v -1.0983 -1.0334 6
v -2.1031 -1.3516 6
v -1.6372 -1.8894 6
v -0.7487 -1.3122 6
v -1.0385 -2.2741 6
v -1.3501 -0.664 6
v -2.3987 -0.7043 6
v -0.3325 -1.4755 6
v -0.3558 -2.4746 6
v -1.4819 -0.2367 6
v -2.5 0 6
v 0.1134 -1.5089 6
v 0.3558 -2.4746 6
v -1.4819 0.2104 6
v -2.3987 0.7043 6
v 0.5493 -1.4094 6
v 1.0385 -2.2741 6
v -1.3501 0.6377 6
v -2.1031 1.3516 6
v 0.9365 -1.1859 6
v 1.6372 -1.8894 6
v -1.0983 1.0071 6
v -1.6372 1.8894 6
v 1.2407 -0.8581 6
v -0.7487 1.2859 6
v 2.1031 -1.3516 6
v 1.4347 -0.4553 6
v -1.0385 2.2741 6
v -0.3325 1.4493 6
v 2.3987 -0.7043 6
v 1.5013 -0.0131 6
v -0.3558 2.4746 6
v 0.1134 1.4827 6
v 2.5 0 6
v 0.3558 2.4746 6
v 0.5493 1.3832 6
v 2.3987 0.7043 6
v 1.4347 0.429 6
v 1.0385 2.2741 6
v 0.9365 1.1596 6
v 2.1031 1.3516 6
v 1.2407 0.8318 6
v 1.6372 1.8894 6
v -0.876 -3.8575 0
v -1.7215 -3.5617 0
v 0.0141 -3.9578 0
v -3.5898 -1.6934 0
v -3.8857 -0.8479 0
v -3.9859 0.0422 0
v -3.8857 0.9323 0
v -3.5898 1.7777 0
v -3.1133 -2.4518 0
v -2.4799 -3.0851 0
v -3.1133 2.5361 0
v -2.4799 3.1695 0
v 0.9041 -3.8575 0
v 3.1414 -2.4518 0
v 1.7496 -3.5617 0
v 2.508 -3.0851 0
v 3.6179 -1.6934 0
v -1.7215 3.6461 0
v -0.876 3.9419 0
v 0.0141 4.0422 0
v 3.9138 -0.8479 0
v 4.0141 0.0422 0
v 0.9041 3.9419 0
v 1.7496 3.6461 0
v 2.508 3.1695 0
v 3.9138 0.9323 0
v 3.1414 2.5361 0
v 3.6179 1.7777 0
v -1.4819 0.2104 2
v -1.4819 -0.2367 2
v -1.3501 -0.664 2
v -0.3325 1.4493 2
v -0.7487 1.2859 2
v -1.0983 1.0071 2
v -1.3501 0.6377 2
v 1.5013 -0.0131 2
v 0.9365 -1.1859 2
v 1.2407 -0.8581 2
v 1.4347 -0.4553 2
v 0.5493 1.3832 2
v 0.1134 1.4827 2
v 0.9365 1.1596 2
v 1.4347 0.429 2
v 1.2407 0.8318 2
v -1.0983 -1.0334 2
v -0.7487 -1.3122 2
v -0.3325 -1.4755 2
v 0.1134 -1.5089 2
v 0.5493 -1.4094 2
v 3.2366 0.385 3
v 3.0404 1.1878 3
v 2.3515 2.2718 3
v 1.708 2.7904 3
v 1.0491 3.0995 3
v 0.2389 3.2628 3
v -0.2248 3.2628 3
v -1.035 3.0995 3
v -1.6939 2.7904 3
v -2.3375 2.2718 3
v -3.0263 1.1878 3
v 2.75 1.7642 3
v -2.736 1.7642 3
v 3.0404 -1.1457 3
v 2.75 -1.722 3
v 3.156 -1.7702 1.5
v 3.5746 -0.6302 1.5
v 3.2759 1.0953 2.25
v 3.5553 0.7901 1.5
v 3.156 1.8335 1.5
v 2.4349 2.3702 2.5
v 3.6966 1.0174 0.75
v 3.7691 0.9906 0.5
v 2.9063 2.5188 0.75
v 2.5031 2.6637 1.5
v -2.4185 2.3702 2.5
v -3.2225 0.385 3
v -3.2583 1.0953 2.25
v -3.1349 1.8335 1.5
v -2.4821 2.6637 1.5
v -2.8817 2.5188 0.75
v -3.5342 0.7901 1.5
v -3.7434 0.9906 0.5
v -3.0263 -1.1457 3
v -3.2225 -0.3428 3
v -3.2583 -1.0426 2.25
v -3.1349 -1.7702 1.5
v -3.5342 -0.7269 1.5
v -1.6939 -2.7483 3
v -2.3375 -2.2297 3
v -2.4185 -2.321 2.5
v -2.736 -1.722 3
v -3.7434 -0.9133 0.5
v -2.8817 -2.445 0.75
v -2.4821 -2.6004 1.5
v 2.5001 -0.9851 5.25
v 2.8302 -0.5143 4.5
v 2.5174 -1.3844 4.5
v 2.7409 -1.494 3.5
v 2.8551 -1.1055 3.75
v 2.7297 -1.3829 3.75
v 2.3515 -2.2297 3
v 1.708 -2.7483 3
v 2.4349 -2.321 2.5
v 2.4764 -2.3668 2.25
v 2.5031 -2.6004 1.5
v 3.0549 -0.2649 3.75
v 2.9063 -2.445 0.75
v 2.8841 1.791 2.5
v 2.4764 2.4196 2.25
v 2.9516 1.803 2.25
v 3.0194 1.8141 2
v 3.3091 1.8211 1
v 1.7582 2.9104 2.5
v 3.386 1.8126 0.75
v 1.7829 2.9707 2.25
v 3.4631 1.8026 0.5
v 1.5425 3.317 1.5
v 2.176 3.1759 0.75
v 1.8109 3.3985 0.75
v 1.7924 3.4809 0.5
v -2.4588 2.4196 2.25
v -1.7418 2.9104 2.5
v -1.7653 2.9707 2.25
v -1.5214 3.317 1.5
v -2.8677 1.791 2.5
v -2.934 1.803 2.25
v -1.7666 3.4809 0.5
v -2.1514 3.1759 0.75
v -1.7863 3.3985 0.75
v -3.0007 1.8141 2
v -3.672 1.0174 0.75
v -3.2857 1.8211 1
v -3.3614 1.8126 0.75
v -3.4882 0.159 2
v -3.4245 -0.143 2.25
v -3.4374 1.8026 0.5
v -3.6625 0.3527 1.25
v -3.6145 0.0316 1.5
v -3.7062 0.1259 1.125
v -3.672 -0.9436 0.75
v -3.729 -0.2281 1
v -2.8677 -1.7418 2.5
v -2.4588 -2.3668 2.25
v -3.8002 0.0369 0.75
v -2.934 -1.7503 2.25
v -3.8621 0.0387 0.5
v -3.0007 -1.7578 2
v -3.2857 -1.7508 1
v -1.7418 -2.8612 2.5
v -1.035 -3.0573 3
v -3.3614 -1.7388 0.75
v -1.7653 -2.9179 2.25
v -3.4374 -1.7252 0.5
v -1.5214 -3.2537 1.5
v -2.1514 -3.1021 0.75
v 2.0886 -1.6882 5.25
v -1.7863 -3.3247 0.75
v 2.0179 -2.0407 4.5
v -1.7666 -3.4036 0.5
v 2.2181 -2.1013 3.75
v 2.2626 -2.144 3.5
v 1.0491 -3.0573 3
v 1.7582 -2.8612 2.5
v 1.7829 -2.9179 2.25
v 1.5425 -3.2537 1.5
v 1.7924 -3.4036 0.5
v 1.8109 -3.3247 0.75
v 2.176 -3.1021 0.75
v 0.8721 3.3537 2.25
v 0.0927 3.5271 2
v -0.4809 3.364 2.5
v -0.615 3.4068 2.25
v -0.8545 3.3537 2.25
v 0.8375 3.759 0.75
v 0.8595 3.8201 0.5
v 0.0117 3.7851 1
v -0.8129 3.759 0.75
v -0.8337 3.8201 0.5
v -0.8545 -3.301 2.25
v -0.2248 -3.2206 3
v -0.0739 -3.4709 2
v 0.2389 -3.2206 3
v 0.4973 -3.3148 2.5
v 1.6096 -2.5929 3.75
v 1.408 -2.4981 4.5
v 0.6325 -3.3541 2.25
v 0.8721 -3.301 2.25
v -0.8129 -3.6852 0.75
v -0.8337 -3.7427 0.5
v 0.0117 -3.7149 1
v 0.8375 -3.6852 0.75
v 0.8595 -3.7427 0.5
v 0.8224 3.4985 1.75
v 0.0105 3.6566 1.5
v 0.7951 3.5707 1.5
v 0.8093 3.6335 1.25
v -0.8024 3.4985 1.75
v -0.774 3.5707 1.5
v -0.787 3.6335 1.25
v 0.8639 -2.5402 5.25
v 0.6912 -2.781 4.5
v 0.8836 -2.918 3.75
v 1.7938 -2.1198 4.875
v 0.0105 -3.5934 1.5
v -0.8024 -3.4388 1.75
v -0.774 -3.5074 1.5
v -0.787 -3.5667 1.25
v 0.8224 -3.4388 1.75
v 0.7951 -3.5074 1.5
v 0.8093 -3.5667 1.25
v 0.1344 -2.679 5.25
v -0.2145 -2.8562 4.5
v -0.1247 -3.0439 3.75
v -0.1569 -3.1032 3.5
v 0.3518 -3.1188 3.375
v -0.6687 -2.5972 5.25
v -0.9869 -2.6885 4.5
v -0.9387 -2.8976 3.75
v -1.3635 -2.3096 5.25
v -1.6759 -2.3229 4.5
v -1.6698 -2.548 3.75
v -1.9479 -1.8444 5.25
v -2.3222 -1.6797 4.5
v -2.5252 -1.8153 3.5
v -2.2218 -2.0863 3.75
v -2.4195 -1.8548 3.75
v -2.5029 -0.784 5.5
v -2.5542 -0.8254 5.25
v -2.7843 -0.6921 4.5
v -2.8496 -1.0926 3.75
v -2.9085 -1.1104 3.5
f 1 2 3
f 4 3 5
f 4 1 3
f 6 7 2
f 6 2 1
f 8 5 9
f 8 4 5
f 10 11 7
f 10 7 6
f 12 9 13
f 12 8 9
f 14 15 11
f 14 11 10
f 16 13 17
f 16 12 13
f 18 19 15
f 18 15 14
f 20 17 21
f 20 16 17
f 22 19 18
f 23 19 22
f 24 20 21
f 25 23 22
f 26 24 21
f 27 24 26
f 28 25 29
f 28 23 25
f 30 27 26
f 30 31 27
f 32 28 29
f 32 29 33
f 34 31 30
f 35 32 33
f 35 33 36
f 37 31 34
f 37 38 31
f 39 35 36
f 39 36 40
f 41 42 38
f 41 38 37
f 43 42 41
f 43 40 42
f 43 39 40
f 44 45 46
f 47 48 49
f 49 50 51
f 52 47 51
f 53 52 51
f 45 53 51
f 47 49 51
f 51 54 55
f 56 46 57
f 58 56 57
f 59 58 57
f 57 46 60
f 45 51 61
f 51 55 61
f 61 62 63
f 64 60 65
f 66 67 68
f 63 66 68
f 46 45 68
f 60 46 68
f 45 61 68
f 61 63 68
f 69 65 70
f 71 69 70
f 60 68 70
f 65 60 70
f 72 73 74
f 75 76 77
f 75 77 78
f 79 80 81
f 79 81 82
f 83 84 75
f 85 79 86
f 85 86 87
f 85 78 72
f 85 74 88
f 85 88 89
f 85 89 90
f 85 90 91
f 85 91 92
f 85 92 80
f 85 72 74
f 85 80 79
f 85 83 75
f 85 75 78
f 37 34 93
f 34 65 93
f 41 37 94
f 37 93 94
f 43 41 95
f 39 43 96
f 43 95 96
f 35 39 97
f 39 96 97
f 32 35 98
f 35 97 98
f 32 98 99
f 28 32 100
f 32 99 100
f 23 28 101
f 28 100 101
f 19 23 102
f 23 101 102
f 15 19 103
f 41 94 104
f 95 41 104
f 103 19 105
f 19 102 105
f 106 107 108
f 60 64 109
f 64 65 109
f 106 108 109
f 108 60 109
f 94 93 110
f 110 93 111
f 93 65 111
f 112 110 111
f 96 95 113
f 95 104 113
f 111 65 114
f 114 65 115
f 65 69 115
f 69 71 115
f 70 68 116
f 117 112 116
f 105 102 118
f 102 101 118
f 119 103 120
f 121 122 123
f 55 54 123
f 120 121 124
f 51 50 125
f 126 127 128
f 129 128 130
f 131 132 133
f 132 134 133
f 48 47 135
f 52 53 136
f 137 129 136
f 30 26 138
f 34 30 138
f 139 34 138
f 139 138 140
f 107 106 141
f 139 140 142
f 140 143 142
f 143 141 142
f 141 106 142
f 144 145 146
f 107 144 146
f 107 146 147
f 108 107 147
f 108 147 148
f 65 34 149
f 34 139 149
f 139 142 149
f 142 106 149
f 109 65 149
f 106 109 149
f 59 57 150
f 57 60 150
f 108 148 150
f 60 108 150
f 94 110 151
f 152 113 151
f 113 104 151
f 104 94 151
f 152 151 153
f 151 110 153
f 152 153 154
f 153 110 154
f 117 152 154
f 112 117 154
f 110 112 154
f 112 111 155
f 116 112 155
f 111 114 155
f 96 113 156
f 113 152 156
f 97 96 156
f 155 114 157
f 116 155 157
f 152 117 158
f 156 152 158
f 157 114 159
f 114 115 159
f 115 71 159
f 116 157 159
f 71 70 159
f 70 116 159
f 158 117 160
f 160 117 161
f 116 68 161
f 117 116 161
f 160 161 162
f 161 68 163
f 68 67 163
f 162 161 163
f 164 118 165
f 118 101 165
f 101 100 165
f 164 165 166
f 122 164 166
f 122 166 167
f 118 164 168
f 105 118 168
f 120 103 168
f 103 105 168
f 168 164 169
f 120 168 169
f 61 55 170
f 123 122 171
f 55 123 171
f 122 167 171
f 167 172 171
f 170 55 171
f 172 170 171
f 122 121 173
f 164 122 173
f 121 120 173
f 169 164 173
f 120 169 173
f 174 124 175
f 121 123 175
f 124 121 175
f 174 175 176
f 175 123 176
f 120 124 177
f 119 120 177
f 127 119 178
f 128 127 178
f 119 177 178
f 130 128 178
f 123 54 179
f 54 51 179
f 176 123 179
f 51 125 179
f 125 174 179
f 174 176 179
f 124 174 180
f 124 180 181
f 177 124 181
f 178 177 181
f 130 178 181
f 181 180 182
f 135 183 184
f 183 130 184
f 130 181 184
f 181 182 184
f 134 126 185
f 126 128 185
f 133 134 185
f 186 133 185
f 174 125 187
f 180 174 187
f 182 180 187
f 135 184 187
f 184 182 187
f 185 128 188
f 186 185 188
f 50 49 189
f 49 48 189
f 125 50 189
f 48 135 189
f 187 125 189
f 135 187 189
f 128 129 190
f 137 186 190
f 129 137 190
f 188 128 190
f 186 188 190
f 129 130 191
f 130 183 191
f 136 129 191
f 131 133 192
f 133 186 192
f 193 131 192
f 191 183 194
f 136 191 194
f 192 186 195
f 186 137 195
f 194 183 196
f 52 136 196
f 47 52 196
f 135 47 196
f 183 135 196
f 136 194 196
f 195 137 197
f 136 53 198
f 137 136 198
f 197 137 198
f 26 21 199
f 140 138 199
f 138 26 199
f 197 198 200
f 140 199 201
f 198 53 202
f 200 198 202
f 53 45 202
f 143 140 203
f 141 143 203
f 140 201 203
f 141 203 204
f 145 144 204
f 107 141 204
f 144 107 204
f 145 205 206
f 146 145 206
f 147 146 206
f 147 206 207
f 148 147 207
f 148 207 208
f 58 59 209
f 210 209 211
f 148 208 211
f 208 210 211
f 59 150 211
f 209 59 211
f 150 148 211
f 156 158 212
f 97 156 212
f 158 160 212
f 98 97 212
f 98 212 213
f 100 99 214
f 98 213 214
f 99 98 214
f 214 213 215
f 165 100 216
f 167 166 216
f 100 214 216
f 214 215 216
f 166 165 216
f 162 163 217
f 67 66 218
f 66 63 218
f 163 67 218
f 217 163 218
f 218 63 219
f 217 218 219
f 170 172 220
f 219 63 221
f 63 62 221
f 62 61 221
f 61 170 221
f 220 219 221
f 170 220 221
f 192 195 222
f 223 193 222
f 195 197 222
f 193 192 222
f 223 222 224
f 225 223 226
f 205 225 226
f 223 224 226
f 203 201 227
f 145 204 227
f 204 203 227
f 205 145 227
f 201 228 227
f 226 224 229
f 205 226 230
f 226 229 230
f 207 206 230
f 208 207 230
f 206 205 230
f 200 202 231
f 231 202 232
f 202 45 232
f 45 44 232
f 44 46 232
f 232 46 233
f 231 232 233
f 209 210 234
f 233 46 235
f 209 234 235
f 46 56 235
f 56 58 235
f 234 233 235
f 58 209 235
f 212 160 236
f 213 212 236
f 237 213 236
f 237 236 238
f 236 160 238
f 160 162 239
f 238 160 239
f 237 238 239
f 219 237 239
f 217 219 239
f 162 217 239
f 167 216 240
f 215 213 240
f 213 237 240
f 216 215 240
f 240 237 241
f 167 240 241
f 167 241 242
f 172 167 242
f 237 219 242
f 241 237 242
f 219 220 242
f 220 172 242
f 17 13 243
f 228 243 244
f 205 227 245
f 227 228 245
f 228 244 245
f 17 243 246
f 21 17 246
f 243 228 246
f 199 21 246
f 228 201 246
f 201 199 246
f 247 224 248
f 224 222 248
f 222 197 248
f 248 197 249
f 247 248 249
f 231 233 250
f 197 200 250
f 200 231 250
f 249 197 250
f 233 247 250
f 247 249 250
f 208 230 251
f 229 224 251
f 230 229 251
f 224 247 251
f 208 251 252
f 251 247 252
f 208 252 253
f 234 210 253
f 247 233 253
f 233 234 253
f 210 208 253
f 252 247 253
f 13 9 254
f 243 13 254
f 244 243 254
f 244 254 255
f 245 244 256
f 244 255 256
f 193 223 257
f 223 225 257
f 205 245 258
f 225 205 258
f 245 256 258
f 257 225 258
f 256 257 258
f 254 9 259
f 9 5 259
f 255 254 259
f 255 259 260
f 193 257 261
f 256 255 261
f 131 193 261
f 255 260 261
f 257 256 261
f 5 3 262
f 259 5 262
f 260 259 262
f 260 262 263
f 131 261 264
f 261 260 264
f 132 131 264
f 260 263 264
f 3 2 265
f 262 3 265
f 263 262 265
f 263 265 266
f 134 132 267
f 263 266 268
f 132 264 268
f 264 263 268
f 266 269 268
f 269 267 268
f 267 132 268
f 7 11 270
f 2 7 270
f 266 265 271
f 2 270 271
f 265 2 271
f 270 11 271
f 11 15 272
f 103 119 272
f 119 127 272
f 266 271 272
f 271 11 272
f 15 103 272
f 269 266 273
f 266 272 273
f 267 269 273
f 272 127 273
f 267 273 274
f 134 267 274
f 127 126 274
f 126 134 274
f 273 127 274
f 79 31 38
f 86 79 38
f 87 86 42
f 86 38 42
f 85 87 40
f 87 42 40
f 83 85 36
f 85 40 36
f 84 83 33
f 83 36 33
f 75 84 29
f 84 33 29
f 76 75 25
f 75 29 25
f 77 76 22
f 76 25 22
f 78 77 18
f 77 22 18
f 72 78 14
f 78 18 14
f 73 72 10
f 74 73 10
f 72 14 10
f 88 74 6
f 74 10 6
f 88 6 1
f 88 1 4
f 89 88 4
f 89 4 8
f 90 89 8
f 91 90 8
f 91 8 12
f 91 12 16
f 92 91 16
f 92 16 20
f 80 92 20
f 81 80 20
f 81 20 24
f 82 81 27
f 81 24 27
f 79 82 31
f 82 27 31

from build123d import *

# Parameters (mm, degrees)
F0_R     = 2.5
F0_R_2   = 1.5
F1_DEPTH = 6
F2_R     = 2.5
F3_R     = 4
F5_R     = 1.5
F6_DEPTH = 4


with BuildPart() as f1:
    # F0 (on Top) → F1 (new body)
    with BuildSketch(Plane.XY):
        Circle(F0_R)
        Circle(F0_R_2, mode=Mode.SUBTRACT)
    extrude(amount=F1_DEPTH)

    # F2 (on face) → F4 section 0
    with BuildSketch(Plane.XY.offset(6)):
        Circle(F2_R)
    # F3 (on face) → F4 section 1
    with BuildSketch(Plane.XY):
        with Locations((0.01406, 0.042179)):
            Circle(F3_R)
    loft()

    # F5 (on face) → F6 (cut)
    with BuildSketch(Plane.XY.offset(6)):
        with Locations((0.001315, -0.013137)):
            Circle(F5_R)
    extrude(amount=-F6_DEPTH, mode=Mode.SUBTRACT)


solid = f1.part
